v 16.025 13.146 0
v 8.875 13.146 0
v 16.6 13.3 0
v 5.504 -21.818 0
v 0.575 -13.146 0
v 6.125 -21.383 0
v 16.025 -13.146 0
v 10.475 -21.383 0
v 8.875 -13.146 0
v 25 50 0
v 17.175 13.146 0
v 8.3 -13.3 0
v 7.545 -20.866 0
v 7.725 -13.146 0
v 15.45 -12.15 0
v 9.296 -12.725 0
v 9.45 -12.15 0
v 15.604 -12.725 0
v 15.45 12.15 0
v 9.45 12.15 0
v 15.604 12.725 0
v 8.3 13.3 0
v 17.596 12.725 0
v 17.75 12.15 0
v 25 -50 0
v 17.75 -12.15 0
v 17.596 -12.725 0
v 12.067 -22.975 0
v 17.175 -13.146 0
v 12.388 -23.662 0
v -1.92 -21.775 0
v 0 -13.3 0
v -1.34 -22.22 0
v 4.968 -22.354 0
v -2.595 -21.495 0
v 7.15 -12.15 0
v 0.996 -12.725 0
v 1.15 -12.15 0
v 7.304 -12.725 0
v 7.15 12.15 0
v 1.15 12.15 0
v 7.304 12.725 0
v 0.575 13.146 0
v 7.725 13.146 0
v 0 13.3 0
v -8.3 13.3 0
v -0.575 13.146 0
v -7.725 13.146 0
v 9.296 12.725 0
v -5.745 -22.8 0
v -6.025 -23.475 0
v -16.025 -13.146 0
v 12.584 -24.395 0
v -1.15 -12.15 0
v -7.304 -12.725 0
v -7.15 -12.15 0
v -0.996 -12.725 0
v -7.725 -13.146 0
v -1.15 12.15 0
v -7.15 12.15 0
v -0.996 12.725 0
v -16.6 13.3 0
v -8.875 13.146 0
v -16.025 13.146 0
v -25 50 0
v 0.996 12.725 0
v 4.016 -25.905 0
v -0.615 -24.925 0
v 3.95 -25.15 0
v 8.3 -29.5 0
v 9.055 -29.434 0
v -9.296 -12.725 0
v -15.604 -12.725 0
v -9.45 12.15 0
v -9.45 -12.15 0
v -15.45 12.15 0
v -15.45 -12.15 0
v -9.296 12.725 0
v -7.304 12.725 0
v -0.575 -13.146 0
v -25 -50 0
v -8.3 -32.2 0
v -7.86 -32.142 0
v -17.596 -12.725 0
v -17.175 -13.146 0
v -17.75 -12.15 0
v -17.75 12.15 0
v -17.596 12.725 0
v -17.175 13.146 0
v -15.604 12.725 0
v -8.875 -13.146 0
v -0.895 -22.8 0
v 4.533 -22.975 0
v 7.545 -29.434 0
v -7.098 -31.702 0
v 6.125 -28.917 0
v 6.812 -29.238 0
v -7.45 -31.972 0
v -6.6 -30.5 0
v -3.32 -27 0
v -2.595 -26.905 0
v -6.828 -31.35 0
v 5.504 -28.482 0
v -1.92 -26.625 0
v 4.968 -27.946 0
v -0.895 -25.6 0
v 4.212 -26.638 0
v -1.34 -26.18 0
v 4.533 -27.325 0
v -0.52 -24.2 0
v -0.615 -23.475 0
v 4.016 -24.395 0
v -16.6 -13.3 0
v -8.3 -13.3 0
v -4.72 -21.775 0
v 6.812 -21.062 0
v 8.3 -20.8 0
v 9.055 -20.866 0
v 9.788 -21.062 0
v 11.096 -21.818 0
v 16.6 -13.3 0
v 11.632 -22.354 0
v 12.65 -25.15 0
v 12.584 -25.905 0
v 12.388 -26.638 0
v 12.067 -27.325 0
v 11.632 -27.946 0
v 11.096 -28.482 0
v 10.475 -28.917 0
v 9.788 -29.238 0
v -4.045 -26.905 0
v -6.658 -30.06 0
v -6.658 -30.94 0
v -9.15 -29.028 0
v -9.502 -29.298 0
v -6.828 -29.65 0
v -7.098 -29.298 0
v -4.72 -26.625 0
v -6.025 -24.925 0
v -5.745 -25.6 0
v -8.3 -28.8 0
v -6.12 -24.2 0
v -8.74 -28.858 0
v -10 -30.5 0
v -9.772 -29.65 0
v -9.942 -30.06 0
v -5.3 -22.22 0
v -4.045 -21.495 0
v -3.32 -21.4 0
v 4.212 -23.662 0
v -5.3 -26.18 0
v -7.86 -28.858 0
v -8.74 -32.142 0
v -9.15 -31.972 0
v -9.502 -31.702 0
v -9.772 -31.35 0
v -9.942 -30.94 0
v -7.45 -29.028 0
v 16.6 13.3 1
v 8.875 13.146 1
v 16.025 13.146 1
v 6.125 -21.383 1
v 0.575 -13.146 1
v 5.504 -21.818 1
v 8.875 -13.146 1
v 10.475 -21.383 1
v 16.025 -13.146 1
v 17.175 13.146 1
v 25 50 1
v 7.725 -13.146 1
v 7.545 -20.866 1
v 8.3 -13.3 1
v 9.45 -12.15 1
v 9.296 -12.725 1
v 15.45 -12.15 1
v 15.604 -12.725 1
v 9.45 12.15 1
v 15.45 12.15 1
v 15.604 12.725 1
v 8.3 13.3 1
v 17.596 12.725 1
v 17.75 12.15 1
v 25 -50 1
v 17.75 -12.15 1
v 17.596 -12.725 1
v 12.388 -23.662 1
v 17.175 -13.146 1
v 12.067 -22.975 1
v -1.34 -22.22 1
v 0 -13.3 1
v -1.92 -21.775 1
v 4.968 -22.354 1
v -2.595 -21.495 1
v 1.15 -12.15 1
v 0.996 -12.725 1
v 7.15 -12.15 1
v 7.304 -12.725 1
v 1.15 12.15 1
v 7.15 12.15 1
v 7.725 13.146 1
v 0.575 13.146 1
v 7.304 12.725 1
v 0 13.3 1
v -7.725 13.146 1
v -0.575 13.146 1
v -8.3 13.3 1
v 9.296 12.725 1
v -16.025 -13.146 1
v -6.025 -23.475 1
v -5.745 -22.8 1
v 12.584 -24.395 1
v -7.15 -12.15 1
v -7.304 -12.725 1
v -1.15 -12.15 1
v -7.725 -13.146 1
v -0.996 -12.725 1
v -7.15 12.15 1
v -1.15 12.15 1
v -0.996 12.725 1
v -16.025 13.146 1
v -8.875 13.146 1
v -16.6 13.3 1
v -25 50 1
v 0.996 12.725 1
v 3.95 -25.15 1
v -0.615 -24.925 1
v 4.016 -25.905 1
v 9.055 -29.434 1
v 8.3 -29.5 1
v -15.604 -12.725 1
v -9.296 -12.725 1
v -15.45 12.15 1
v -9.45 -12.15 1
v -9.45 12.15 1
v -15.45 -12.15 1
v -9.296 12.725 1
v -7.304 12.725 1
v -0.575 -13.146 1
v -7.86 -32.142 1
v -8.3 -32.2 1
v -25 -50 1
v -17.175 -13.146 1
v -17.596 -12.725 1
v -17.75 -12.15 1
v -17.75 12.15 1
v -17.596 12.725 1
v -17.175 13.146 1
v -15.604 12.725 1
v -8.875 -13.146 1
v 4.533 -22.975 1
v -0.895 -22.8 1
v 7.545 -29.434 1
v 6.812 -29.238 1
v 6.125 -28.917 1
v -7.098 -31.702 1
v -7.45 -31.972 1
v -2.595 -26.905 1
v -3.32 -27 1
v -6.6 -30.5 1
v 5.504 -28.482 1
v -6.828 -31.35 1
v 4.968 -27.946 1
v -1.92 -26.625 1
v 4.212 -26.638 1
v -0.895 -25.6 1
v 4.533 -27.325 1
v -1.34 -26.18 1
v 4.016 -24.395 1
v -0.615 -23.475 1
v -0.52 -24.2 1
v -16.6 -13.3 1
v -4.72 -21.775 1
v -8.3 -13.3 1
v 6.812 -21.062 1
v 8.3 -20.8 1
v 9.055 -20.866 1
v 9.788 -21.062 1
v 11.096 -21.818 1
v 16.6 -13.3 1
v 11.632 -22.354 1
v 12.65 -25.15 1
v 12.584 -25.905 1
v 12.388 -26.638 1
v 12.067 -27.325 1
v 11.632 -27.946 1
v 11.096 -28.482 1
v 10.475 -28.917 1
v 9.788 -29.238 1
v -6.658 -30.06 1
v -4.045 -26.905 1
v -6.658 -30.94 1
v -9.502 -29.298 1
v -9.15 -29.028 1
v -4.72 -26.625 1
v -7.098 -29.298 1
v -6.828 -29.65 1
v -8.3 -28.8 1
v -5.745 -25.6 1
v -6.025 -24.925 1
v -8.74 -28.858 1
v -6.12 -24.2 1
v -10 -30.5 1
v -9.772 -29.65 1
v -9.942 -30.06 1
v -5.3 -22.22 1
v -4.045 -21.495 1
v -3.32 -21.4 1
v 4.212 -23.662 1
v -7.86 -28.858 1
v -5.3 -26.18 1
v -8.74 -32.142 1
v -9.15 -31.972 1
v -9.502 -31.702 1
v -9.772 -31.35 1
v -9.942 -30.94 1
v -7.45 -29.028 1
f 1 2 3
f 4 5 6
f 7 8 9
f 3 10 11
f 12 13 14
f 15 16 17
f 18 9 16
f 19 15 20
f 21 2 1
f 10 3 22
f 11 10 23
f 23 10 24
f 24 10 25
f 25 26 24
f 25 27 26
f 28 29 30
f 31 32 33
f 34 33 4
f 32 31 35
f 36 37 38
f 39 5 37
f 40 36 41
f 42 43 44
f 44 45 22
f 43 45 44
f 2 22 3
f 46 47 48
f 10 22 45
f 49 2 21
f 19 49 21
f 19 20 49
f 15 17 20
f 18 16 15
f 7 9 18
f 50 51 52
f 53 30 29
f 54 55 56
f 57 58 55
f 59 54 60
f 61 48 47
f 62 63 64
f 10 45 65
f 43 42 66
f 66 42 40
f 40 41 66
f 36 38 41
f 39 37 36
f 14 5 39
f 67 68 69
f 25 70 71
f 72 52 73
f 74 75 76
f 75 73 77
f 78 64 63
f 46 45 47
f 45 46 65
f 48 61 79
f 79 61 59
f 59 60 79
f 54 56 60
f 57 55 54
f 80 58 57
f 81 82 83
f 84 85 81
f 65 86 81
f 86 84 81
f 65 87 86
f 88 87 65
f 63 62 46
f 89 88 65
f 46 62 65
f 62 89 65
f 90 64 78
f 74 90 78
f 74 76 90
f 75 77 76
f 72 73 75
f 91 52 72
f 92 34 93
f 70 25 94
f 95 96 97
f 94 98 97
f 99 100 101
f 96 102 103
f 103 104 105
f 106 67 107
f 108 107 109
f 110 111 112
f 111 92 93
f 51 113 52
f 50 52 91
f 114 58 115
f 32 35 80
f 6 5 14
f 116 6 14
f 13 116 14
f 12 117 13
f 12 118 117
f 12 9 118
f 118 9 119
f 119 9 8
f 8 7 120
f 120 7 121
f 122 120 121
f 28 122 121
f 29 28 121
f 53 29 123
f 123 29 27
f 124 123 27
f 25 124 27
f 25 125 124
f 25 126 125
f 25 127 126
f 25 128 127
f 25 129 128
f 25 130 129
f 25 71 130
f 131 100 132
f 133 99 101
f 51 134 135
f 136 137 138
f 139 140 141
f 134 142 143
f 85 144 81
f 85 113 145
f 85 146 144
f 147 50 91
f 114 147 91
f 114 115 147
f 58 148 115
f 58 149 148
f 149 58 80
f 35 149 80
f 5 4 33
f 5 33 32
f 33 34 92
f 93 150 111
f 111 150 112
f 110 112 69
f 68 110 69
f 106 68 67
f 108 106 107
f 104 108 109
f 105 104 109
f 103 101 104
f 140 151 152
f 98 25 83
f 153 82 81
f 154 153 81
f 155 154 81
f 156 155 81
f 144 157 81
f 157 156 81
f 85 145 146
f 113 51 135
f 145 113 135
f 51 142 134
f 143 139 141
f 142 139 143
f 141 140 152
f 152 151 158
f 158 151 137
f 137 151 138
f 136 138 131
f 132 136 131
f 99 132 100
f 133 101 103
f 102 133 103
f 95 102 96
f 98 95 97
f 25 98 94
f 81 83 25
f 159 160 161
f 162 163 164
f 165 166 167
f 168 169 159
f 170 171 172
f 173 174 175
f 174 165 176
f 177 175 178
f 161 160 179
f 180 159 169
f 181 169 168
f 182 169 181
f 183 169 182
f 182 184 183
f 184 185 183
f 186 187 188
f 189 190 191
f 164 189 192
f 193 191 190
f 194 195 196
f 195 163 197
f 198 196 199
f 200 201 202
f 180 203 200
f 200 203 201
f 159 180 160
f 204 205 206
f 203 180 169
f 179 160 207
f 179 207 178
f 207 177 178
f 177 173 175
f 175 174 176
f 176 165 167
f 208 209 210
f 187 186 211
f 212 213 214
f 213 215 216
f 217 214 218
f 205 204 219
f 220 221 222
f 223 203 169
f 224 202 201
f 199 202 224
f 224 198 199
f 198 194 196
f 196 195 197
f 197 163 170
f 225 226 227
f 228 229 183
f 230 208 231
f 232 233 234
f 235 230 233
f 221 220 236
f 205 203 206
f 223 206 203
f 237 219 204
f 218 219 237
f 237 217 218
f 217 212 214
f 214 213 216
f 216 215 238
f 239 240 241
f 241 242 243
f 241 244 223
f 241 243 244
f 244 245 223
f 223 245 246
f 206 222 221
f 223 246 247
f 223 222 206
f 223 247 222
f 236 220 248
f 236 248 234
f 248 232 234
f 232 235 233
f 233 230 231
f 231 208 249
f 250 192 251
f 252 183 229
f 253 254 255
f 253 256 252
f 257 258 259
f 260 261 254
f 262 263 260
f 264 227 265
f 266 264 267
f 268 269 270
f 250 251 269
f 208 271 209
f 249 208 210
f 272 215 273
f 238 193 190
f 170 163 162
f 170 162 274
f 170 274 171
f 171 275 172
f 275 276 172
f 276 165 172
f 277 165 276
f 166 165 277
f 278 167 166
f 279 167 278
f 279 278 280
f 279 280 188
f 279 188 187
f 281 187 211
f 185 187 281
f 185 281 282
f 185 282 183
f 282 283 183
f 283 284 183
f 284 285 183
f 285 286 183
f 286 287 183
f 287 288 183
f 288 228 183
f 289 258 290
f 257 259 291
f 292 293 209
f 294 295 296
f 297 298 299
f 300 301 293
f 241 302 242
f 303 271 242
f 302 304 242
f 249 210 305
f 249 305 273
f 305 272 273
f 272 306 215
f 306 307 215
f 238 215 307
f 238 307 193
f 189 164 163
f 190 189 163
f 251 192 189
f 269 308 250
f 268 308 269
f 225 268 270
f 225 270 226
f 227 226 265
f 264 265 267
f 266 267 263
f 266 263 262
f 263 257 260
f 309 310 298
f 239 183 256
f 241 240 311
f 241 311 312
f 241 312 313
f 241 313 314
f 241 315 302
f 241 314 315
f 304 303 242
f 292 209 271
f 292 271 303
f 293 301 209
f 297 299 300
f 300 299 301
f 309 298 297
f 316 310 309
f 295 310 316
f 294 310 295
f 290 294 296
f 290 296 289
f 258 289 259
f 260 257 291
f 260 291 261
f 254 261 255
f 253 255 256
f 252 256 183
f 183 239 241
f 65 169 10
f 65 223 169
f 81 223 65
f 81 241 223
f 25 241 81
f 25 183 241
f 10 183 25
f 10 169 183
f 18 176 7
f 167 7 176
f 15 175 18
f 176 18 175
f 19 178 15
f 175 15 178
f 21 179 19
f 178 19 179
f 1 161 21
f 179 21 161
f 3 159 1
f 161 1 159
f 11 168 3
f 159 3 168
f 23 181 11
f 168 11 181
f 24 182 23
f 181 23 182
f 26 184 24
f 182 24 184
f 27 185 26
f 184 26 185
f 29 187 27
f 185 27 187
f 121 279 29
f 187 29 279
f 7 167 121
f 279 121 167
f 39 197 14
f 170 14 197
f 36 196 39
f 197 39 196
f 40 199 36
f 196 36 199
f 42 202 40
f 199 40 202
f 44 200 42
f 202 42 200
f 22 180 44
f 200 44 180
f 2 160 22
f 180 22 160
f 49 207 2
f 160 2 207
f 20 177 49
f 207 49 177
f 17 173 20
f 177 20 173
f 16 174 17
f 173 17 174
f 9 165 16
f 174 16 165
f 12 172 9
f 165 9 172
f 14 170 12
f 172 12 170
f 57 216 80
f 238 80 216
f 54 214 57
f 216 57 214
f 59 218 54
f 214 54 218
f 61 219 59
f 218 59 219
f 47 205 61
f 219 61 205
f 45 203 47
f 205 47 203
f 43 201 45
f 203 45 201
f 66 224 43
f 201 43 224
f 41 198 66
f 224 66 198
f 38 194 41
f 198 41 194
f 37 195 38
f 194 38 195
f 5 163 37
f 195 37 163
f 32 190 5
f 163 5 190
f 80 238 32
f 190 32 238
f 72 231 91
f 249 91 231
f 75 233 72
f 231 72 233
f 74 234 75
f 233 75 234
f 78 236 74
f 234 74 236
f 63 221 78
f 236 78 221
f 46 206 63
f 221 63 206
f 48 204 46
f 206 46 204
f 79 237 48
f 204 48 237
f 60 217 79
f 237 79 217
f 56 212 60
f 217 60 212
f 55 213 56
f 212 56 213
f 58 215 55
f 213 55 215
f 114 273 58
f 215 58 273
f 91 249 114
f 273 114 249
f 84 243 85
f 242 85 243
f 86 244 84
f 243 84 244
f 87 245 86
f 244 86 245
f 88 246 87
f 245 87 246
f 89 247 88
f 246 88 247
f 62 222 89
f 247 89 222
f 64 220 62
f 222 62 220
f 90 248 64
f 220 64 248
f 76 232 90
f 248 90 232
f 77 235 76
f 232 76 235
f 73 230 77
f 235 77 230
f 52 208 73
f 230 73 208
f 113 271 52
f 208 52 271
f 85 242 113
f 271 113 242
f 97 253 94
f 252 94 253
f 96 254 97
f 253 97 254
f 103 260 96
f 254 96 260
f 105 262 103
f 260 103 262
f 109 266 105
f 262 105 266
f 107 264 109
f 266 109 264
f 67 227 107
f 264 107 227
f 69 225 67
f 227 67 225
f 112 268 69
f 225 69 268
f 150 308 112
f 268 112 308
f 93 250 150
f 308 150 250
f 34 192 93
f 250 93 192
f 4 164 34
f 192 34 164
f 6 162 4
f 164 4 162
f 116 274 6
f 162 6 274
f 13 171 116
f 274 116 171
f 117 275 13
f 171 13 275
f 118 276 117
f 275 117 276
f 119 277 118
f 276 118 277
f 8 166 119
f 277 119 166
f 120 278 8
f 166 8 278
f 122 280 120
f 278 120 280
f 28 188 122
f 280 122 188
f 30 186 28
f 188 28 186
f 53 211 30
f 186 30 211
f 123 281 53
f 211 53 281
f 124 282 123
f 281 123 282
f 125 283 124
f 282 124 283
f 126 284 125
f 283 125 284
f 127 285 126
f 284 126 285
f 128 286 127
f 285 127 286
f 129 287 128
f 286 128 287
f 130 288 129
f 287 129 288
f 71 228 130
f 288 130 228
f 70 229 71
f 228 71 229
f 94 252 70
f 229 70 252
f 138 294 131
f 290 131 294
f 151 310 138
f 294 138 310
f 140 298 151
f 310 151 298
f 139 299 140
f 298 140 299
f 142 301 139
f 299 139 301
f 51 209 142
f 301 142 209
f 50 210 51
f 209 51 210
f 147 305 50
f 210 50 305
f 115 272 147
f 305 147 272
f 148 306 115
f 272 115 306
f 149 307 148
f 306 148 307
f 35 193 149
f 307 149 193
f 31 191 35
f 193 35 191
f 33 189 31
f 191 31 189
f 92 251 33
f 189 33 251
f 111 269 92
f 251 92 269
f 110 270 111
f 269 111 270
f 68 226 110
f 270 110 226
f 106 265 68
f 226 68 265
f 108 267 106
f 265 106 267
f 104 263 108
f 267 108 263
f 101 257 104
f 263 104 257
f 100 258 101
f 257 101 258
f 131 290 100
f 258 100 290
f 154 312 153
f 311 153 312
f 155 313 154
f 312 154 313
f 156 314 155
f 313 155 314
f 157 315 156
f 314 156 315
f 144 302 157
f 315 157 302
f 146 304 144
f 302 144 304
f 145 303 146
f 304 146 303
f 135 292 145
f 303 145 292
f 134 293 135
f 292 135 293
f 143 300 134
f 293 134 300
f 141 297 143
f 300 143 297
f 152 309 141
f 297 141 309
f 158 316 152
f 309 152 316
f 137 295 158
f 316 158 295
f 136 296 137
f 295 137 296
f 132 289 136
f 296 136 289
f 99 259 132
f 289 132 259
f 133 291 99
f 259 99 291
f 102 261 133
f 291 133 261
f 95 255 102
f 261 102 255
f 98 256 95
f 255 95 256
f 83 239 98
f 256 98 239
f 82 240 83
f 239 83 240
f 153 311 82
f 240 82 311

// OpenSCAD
linear_extrude(1)difference(){
    square ([50,100],center=true);
    
 translate([6+2.3,0]*2)hull(){   
translate([0,(26.6-2.3)/2])    circle(2.3/2,$fn=12);
translate([0,-(26.6-2.3)/2])     circle(2.3/2,$fn=12);
}

 translate([6+2.3,0]*1)hull(){   
translate([0,(26.6-2.3)/2])    circle(2.3/2,$fn=12);
translate([0,-(26.6-2.3)/2])     circle(2.3/2,$fn=12);
}

 translate([6+2.3,0]*0)hull(){   
translate([0,(26.6-2.3)/2])    circle(2.3/2,$fn=12);
translate([0,-(26.6-2.3)/2])     circle(2.3/2,$fn=12);
}

 translate([6+2.3,0]*-1)hull(){   
translate([0,(26.6-2.3)/2])    circle(2.3/2,$fn=12);
translate([0,-(26.6-2.3)/2])     circle(2.3/2,$fn=12);
}

 translate([6+2.3,0]*-2)hull(){   
translate([0,(26.6-2.3)/2])    circle(2.3/2,$fn=12);
translate([0,-(26.6-2.3)/2])     circle(2.3/2,$fn=12);
}

 translate([6+2.3,0]*1)hull(){   
translate(-[0,(26.6)/2+7.5+8.7/2])    circle(8.7/2,$fn=36);
 
}
 translate([6+2.3,0]*-1)hull(){   
translate(-[0,(26.6)/2+15.5+3.4/2])    circle(3.4/2,$fn=24);
 
}

translate([6+2.3,0]*-0.4)hull(){   
translate(-[0,(26.6)/2+8.1+5.6/2])    circle(5.6/2,$fn=24);
 
}
}
